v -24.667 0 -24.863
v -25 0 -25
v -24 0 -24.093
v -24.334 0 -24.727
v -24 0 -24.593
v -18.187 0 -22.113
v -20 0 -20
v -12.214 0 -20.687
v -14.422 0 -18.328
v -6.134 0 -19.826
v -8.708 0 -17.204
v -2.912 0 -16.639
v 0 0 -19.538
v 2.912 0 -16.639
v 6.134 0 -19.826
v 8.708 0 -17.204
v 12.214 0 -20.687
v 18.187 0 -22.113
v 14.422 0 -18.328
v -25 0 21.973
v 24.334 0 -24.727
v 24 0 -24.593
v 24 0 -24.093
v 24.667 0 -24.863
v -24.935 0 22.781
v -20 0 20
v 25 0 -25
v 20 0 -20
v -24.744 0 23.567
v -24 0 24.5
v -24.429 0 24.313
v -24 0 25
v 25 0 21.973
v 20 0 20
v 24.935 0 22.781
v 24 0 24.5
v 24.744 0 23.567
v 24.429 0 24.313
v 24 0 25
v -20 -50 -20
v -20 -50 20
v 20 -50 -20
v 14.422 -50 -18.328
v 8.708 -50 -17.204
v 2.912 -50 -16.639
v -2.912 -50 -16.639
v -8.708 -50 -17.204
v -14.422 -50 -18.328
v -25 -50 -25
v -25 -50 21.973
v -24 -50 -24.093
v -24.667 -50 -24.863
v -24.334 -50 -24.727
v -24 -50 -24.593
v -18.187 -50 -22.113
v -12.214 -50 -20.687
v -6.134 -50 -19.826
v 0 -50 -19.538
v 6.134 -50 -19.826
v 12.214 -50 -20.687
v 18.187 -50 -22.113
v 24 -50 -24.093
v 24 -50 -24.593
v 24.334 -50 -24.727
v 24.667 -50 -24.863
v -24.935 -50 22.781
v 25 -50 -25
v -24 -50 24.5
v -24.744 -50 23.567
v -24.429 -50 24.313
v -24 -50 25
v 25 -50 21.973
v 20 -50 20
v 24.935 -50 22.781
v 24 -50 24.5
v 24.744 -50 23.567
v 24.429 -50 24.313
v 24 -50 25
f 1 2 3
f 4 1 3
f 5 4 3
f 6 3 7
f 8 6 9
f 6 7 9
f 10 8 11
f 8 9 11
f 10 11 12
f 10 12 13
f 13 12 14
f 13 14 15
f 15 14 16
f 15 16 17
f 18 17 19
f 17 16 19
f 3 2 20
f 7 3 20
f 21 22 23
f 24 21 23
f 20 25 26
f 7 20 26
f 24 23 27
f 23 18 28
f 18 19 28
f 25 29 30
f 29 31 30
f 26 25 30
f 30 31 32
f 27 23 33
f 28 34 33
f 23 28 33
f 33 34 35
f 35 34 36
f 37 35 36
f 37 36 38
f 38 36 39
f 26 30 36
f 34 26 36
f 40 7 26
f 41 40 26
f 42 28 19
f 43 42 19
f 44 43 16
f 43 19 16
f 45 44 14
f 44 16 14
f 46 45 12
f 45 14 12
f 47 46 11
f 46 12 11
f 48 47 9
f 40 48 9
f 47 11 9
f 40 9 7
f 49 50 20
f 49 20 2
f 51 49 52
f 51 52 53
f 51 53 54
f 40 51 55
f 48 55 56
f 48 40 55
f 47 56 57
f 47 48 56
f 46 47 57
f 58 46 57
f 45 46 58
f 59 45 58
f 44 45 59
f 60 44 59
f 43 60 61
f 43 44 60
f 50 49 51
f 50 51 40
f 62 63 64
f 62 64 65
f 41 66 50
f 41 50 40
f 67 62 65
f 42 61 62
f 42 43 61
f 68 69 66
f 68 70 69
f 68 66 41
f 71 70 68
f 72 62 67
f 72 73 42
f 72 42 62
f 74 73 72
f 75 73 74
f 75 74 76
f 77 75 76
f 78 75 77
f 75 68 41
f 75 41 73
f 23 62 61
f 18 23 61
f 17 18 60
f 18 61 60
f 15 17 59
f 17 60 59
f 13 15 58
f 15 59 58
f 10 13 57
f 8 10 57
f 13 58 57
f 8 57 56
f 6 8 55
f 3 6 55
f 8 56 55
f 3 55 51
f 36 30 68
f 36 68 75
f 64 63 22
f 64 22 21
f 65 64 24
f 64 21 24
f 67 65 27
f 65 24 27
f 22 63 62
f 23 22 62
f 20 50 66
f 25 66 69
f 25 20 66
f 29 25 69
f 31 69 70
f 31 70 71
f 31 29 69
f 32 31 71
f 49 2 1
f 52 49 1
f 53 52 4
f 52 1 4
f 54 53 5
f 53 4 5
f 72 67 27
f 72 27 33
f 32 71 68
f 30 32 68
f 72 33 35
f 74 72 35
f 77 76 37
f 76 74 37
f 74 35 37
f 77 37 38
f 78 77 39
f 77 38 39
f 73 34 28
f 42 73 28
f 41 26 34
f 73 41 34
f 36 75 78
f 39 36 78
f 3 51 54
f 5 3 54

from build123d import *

# Parameters (mm, degrees)
F1_DEPTH    = 50
F2_W        = 48
F2_H        = 0.5
F2_H_2      = 1.5
F3_DEPTH    = 50
F4_T1_DEPTH = 65.1327459504


# Not quite as in the source:
# - a fillet or chamfer that OpenCascade refuses, or shapes differently, is made with other operations: its cross-section is extruded or revolved along the edge and cut away or added


with BuildPart() as f1:
    # F0 (on Front) → F1 (new body)
    with BuildSketch(Plane.XZ):
        with BuildLine():
            Line((25, -25), (25, 25))
            Line((25, 25), (-25, 25))
            Line((-25, 25), (-25, -25))
            ThreePointArc((-25, -25), (0, -20), (25, -25))
        make_face()
        with BuildLine():
            Line((-20, 20), (20, 20))
            Line((20, 20), (20, -20))
            ThreePointArc((20, -20), (0, -16.5685424949), (-20, -20))
            Line((-20, -20), (-20, 20))
        make_face(mode=Mode.SUBTRACT)
    extrude(amount=F1_DEPTH)

    # F2 (on face) → F3 (cut)
    with BuildSketch(Plane.XZ.offset(50)):
        with Locations((0, 24.75)):
            Rectangle(F2_W, F2_H)
        with Locations((0, 25.75)):
            Rectangle(F2_W, F2_H_2)
        with BuildLine():
            Line((-24, -24.0930467578), (-24, -24.5930467578))
            ThreePointArc((-24, -24.5930467578), (0, -20), (24, -24.5930467578))
            Line((24, -24.5930467578), (24, -24.0930467578))
            ThreePointArc((24, -24.0930467578), (0, -19.5376937746), (-24, -24.0930467578))
        make_face()
    extrude(amount=-F3_DEPTH, mode=Mode.SUBTRACT)

    # F4: fillet of radius 5.08 on 2 edges, made by hand

    # F4_s2 → F4_t1 (cut)
    with BuildSketch(Plane.XZ.offset(-7.5663729752)):
        with BuildLine():
            ThreePointArc((25, 21.9734508099), (24.7435256815, 23.567188555), (24, 25))
            Line((24, 25), (25, 25))
            Line((25, 25), (25, 21.9734508099))
        make_face()
        with BuildLine():
            ThreePointArc((-25, 21.9734508099), (-24.7435256815, 23.567188555), (-24, 25))
            Line((-24, 25), (-25, 25))
            Line((-25, 25), (-25, 21.9734508099))
        make_face()
    extrude(amount=F4_T1_DEPTH, mode=Mode.SUBTRACT)


solid = f1.part
